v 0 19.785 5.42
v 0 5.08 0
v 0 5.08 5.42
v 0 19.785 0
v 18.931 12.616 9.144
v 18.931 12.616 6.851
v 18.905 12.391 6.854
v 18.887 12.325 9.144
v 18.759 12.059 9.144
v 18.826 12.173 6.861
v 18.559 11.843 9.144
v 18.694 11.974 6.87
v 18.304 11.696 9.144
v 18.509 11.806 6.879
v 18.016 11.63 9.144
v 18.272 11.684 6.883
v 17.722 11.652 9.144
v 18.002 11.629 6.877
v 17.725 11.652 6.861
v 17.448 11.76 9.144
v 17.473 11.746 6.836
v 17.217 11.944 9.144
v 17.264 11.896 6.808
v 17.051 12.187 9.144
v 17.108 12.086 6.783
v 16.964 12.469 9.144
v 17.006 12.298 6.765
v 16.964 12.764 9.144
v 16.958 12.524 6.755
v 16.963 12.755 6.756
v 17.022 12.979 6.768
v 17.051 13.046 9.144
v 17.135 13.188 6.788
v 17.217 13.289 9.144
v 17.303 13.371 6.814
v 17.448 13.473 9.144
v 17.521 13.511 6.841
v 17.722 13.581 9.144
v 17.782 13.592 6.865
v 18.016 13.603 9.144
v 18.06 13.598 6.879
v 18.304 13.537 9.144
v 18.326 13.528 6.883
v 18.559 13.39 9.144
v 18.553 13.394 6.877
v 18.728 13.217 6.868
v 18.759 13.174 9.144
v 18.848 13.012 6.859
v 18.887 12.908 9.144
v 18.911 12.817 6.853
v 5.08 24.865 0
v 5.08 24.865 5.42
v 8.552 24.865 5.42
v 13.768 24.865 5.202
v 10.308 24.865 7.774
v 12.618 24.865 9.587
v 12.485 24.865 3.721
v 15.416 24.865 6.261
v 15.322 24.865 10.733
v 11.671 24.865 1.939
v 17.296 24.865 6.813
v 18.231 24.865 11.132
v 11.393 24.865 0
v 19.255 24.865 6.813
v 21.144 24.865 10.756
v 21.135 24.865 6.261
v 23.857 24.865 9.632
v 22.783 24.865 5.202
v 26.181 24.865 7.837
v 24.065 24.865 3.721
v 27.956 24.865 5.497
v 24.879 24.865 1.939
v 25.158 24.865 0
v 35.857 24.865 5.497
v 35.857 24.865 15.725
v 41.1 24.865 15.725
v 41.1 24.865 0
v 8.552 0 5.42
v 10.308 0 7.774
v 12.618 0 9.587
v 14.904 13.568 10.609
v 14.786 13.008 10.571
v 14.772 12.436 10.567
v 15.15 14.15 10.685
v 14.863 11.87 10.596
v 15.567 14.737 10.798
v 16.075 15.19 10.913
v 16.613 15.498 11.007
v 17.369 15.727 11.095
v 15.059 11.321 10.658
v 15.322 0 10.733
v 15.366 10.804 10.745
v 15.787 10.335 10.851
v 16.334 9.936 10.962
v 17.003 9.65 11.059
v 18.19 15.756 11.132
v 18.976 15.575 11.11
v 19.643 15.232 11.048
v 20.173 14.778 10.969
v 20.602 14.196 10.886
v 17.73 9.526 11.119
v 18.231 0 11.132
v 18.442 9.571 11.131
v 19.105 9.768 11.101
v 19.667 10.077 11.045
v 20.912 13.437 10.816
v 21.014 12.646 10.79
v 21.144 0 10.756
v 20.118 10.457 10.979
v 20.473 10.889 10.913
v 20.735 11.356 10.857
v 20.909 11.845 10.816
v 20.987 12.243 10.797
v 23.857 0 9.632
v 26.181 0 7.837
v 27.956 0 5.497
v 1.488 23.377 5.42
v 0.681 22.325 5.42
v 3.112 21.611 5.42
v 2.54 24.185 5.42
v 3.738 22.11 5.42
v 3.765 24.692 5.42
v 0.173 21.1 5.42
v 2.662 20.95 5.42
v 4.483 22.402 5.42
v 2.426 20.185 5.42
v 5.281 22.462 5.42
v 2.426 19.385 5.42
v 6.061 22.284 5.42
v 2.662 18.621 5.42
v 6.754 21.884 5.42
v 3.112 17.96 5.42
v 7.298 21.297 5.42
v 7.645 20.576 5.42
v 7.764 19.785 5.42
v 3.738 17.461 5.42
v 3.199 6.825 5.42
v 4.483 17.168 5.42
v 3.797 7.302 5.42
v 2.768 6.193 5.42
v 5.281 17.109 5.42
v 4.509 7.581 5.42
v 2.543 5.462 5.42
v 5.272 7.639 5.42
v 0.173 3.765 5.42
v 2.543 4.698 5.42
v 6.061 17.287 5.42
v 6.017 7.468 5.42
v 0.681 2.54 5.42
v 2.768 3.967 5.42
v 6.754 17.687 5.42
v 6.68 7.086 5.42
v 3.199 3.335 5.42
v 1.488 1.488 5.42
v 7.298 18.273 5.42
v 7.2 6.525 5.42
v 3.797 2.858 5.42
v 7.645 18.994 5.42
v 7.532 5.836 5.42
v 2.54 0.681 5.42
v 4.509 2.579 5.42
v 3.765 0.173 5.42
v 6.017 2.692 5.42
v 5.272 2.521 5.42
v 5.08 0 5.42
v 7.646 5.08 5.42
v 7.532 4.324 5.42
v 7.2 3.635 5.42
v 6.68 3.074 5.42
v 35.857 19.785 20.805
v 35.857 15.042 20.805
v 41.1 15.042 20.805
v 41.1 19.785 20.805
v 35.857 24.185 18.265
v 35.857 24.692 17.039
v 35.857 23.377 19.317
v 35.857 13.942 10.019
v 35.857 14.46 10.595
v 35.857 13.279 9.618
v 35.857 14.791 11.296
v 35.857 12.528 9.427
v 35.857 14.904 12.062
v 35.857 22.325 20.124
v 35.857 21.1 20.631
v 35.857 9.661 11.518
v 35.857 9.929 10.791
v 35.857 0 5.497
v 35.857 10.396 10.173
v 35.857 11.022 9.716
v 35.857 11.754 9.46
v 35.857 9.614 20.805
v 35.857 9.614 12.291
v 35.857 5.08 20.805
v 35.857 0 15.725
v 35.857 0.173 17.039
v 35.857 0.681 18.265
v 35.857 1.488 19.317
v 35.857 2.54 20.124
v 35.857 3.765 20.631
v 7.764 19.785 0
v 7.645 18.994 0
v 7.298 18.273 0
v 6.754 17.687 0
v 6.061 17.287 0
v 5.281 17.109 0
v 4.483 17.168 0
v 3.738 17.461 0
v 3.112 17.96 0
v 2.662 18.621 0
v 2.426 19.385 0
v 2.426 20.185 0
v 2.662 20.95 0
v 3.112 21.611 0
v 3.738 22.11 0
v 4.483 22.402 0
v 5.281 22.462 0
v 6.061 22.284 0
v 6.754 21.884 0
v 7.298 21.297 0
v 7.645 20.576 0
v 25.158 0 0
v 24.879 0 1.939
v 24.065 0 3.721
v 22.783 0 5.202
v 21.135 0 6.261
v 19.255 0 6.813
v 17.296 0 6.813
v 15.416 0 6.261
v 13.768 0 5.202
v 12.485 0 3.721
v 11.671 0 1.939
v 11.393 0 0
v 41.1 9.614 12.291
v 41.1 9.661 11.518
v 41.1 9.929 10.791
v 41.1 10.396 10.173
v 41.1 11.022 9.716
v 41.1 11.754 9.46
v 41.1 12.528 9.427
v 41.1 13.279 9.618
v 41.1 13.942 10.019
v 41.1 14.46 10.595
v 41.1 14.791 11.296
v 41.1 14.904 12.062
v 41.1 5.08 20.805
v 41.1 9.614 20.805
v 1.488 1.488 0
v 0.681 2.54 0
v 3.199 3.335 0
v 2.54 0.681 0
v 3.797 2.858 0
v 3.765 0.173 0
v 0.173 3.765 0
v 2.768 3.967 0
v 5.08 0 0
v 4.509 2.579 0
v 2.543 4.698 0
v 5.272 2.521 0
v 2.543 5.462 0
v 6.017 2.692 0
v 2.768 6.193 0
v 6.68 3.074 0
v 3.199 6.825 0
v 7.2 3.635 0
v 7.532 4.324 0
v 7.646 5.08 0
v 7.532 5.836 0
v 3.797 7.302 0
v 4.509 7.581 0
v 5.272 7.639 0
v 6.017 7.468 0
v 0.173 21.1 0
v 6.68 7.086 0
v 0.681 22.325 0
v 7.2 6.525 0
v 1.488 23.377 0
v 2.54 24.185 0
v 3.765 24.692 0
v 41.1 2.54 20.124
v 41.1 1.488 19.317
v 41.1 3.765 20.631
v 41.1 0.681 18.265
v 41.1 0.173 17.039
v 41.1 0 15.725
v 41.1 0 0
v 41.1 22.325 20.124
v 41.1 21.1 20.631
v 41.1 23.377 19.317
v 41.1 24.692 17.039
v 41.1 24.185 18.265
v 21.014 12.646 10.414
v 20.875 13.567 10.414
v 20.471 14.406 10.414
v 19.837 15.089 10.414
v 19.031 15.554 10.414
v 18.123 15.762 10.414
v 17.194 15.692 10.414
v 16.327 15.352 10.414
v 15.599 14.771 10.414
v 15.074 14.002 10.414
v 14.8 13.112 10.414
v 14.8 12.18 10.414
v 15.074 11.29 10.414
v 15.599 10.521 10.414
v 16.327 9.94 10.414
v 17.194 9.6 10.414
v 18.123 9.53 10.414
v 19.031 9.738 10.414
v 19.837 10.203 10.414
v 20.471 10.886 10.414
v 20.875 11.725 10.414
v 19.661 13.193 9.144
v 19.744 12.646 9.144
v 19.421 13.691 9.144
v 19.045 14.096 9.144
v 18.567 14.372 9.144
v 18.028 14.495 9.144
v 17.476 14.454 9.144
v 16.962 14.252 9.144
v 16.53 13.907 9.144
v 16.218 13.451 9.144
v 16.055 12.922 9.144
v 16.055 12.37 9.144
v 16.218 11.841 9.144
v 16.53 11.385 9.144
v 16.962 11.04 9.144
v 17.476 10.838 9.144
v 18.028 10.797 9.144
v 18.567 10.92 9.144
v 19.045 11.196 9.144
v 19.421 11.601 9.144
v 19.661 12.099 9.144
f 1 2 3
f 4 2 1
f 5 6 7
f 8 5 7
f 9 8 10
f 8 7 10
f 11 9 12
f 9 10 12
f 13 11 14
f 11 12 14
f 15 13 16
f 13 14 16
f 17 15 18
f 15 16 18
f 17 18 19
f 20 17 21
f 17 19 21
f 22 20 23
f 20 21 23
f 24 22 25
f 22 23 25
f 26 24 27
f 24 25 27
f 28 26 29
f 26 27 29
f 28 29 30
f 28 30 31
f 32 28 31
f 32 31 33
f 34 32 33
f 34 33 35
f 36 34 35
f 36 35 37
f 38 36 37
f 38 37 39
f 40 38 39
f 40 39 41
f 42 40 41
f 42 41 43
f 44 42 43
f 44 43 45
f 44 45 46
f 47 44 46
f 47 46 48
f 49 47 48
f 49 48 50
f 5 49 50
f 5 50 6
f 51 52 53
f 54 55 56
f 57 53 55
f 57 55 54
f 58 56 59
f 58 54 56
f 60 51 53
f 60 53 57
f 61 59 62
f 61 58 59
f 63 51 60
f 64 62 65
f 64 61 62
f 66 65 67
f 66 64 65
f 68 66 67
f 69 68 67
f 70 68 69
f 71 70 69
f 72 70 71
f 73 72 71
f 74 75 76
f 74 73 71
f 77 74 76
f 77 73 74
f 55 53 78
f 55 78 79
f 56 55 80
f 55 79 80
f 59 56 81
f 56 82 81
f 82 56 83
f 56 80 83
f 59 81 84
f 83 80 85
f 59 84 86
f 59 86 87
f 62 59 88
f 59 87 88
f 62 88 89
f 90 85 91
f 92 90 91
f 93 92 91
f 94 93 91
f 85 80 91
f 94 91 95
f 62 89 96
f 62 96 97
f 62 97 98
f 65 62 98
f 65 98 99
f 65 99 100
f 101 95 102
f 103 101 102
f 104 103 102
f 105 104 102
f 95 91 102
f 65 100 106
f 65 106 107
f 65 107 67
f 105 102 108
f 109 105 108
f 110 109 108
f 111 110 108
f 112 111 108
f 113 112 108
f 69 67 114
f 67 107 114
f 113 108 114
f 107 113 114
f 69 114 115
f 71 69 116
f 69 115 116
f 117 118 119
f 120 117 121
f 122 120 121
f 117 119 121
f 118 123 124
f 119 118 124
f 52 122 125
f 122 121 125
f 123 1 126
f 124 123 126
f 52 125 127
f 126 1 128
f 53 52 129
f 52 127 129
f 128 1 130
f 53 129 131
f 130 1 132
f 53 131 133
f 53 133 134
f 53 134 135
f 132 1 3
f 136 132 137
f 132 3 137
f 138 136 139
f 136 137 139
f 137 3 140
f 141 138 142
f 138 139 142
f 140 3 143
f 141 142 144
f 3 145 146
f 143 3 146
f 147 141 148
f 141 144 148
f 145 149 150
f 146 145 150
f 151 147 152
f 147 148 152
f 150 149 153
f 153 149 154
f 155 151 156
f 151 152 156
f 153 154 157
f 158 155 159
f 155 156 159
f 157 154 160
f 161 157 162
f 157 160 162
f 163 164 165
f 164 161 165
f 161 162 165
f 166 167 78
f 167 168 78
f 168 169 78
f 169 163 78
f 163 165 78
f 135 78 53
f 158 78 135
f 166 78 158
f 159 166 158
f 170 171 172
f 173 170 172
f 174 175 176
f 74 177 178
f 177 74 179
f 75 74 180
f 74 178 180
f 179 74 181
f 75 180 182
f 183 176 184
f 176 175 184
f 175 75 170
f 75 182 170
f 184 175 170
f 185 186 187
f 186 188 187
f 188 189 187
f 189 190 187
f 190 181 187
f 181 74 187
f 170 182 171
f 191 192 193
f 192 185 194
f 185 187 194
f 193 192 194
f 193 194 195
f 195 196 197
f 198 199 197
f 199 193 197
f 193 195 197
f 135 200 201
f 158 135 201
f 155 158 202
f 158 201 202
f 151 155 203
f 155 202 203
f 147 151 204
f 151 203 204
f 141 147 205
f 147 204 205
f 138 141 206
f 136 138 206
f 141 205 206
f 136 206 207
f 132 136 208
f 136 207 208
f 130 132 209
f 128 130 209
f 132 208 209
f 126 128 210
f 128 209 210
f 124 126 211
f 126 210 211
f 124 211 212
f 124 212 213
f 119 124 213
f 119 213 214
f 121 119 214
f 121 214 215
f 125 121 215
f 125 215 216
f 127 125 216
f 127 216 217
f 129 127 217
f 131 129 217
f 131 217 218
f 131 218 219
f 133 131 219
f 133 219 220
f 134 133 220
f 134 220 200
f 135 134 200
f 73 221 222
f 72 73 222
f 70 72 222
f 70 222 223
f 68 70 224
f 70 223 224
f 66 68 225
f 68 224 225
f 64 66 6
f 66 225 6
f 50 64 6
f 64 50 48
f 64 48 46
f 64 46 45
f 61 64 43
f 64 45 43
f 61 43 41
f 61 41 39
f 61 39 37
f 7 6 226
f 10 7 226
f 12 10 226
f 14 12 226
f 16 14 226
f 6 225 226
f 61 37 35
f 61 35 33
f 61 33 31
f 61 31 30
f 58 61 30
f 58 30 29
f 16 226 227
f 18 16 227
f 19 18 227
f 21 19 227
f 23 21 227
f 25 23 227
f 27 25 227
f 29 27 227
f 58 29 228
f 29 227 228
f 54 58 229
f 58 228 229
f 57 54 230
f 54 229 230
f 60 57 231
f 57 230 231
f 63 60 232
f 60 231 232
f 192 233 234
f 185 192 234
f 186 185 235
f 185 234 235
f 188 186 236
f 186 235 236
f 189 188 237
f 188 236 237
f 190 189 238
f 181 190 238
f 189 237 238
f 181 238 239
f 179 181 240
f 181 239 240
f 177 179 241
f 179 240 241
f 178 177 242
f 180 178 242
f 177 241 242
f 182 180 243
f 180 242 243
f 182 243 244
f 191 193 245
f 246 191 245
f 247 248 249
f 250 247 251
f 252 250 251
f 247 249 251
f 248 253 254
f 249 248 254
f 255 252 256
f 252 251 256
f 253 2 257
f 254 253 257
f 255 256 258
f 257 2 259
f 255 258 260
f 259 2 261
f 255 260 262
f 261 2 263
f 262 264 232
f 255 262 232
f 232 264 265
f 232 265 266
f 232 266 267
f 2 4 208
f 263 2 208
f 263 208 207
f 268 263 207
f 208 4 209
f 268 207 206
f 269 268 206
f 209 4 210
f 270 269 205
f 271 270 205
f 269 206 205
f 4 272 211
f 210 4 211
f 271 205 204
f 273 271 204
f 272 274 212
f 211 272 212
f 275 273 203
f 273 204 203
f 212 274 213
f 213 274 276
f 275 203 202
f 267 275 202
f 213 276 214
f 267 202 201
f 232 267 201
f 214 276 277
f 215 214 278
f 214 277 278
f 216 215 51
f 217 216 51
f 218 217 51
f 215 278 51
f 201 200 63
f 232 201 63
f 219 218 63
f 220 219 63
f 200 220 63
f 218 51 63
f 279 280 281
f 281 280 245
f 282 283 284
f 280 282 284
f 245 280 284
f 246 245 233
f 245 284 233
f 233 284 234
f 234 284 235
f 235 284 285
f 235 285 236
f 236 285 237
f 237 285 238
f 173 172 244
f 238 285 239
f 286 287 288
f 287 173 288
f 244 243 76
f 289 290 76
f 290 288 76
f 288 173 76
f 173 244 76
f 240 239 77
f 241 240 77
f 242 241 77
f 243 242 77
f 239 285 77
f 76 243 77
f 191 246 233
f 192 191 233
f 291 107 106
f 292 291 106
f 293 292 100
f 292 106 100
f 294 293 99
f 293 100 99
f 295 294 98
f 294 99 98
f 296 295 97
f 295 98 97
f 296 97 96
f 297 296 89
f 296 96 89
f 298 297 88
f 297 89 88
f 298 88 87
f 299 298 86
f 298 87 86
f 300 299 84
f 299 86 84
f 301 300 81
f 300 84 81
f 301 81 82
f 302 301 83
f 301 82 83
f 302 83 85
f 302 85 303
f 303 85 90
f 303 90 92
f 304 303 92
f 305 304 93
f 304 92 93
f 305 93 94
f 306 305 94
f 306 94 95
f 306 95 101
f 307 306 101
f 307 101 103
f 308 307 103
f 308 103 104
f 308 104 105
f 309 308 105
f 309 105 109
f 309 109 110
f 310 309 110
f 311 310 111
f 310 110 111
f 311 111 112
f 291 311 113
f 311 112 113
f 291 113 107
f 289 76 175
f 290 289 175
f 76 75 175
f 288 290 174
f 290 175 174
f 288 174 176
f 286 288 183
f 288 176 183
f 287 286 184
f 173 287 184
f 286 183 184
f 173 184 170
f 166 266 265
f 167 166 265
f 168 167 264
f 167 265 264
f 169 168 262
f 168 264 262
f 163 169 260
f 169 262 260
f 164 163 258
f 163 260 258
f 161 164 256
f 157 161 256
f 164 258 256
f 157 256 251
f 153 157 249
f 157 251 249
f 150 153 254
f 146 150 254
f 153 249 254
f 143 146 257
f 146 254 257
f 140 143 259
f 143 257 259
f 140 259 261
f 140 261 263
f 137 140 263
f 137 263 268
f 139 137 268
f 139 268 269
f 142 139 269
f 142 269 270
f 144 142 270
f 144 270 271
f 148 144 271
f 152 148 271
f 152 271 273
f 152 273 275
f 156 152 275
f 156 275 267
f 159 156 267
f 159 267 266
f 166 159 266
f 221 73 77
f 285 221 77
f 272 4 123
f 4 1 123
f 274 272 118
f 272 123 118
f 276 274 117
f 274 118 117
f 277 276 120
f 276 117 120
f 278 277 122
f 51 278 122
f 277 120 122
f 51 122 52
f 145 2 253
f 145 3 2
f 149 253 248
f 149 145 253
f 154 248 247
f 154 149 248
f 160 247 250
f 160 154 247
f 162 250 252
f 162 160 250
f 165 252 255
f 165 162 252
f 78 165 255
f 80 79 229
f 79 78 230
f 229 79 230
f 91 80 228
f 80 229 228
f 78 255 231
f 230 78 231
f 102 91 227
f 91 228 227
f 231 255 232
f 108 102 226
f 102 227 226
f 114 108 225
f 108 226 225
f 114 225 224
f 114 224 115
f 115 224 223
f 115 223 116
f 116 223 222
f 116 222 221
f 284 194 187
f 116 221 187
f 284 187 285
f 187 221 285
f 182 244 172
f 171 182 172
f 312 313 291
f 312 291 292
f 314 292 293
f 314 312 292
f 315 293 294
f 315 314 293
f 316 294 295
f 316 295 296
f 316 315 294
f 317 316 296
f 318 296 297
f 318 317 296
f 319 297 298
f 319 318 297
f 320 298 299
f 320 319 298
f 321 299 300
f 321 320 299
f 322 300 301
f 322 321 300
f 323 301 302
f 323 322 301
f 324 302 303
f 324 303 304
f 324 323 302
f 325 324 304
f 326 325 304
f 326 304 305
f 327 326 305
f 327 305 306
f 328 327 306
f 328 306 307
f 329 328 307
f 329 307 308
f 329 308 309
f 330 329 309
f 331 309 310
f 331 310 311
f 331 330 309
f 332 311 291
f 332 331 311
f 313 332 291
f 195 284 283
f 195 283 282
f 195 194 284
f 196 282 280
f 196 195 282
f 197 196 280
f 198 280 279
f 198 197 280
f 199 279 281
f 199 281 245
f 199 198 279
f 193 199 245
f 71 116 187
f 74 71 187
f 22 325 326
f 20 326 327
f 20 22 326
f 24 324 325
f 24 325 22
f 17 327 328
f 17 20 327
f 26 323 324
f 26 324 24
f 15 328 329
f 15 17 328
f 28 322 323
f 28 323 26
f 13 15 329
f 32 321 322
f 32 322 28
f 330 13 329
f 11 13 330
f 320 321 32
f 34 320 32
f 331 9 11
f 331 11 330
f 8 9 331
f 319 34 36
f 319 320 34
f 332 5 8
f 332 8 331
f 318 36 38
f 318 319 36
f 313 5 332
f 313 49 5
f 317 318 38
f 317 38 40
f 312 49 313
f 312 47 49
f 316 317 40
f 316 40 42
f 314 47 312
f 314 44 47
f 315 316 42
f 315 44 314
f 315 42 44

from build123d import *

# Parameters (mm, degrees)
F0_W      = 41.100144
F0_H      = 24.865199
F1_DEPTH  = 26.924
F3_DEPTH  = 33.02
F5_DEPTH  = 9.906
F6_R      = 5.08
F7_R      = 2.565784
F7_R_2    = 2.684089
F7_R_3    = 0.988896
F8_DEPTH  = 25.4
F10_R     = 3.124408
F11_DEPTH = 20.574
F12_SIZE  = 1.27


with BuildPart() as f1:
    # F0 (on Top) → F1 (new body)
    with BuildSketch(Plane.XY):
        with Locations((20.550072, 12.4326)):
            Rectangle(F0_W, F0_H)
    extrude(amount=F1_DEPTH)

    # F2 (on Front) → F3 (cut)
    with BuildSketch(Plane.XZ):
        with BuildLine():
            Line((11.39266, 0), (25.158048, 0))
            ThreePointArc((25.158048, 0), (18.275354, 6.882694), (11.39266, 0))
        make_face()
        with BuildLine():
            ThreePointArc((8.551842, 5.420331), (18.231203, 11.132148), (27.955566, 5.497288))
            Line((27.955566, 5.497288), (35.856735, 5.497288))
            Line((35.856735, 5.497288), (35.856735, 20.804519))
            Line((35.856735, 20.804519), (43.18231, 20.804519))
            Line((43.18231, 20.804519), (42.240448, 32.735568))
            Line((42.240448, 32.735568), (-4.643232, 32.735568))
            Line((-4.643232, 32.735568), (0, 5.420331))
            Line((0, 5.420331), (8.551842, 5.420331))
        make_face()
    extrude(amount=-F3_DEPTH, mode=Mode.SUBTRACT)

    # F4 (on face) → F5 (cut)
    with BuildSketch(Plane.YZ.offset(41.100144)):
        with BuildLine():
            Line((9.614374, 20.804519), (9.614374, 12.291135))
            ThreePointArc((9.614374, 12.291135), (12.13957, 9.414848), (14.903929, 12.062103))
            Line((14.903929, 12.062103), (15.042416, 20.804519))
            Line((15.042416, 20.804519), (9.614374, 20.804519))
        make_face()
    extrude(amount=-F5_DEPTH, mode=Mode.SUBTRACT)

    # F6
    f6_edges = [f1.edges().sort_by_distance(p)[0] for p in [
        (38.47844, 0, 20.804519),
        (38.47844, 24.865199, 20.804519),
        (0, 24.865199, 2.710165),
        (0, 0, 2.710165),
    ]]
    fillet(f6_edges, radius=F6_R)

    # F7 (on face) → F8 (cut)
    with BuildSketch(Plane(origin=(0, 0, 0), x_dir=(1, 0, 0), z_dir=(0, 0, -1))):
        with Locations((5.08, -5.08)):
            Circle(F7_R)
        with Locations((5.08, -19.785199)):
            Circle(F7_R_2)
        with Locations((17.942235, -12.616471)):
            Circle(F7_R_3)
    extrude(amount=-F8_DEPTH, mode=Mode.SUBTRACT)

    # F10 (on offset) → F11 (cut)
    with BuildSketch(Plane.XY.offset(29.718)):
        with Locations((17.889135, 12.645945)):
            Circle(F10_R)
    extrude(amount=-F11_DEPTH, mode=Mode.SUBTRACT)

    # F12
    f12_edges = [f1.edges().sort_by_distance(p)[0] for p in [
        (14.764727, 12.645945, 9.144),
    ]]
    chamfer(f12_edges, length=F12_SIZE)


solid = f1.part
